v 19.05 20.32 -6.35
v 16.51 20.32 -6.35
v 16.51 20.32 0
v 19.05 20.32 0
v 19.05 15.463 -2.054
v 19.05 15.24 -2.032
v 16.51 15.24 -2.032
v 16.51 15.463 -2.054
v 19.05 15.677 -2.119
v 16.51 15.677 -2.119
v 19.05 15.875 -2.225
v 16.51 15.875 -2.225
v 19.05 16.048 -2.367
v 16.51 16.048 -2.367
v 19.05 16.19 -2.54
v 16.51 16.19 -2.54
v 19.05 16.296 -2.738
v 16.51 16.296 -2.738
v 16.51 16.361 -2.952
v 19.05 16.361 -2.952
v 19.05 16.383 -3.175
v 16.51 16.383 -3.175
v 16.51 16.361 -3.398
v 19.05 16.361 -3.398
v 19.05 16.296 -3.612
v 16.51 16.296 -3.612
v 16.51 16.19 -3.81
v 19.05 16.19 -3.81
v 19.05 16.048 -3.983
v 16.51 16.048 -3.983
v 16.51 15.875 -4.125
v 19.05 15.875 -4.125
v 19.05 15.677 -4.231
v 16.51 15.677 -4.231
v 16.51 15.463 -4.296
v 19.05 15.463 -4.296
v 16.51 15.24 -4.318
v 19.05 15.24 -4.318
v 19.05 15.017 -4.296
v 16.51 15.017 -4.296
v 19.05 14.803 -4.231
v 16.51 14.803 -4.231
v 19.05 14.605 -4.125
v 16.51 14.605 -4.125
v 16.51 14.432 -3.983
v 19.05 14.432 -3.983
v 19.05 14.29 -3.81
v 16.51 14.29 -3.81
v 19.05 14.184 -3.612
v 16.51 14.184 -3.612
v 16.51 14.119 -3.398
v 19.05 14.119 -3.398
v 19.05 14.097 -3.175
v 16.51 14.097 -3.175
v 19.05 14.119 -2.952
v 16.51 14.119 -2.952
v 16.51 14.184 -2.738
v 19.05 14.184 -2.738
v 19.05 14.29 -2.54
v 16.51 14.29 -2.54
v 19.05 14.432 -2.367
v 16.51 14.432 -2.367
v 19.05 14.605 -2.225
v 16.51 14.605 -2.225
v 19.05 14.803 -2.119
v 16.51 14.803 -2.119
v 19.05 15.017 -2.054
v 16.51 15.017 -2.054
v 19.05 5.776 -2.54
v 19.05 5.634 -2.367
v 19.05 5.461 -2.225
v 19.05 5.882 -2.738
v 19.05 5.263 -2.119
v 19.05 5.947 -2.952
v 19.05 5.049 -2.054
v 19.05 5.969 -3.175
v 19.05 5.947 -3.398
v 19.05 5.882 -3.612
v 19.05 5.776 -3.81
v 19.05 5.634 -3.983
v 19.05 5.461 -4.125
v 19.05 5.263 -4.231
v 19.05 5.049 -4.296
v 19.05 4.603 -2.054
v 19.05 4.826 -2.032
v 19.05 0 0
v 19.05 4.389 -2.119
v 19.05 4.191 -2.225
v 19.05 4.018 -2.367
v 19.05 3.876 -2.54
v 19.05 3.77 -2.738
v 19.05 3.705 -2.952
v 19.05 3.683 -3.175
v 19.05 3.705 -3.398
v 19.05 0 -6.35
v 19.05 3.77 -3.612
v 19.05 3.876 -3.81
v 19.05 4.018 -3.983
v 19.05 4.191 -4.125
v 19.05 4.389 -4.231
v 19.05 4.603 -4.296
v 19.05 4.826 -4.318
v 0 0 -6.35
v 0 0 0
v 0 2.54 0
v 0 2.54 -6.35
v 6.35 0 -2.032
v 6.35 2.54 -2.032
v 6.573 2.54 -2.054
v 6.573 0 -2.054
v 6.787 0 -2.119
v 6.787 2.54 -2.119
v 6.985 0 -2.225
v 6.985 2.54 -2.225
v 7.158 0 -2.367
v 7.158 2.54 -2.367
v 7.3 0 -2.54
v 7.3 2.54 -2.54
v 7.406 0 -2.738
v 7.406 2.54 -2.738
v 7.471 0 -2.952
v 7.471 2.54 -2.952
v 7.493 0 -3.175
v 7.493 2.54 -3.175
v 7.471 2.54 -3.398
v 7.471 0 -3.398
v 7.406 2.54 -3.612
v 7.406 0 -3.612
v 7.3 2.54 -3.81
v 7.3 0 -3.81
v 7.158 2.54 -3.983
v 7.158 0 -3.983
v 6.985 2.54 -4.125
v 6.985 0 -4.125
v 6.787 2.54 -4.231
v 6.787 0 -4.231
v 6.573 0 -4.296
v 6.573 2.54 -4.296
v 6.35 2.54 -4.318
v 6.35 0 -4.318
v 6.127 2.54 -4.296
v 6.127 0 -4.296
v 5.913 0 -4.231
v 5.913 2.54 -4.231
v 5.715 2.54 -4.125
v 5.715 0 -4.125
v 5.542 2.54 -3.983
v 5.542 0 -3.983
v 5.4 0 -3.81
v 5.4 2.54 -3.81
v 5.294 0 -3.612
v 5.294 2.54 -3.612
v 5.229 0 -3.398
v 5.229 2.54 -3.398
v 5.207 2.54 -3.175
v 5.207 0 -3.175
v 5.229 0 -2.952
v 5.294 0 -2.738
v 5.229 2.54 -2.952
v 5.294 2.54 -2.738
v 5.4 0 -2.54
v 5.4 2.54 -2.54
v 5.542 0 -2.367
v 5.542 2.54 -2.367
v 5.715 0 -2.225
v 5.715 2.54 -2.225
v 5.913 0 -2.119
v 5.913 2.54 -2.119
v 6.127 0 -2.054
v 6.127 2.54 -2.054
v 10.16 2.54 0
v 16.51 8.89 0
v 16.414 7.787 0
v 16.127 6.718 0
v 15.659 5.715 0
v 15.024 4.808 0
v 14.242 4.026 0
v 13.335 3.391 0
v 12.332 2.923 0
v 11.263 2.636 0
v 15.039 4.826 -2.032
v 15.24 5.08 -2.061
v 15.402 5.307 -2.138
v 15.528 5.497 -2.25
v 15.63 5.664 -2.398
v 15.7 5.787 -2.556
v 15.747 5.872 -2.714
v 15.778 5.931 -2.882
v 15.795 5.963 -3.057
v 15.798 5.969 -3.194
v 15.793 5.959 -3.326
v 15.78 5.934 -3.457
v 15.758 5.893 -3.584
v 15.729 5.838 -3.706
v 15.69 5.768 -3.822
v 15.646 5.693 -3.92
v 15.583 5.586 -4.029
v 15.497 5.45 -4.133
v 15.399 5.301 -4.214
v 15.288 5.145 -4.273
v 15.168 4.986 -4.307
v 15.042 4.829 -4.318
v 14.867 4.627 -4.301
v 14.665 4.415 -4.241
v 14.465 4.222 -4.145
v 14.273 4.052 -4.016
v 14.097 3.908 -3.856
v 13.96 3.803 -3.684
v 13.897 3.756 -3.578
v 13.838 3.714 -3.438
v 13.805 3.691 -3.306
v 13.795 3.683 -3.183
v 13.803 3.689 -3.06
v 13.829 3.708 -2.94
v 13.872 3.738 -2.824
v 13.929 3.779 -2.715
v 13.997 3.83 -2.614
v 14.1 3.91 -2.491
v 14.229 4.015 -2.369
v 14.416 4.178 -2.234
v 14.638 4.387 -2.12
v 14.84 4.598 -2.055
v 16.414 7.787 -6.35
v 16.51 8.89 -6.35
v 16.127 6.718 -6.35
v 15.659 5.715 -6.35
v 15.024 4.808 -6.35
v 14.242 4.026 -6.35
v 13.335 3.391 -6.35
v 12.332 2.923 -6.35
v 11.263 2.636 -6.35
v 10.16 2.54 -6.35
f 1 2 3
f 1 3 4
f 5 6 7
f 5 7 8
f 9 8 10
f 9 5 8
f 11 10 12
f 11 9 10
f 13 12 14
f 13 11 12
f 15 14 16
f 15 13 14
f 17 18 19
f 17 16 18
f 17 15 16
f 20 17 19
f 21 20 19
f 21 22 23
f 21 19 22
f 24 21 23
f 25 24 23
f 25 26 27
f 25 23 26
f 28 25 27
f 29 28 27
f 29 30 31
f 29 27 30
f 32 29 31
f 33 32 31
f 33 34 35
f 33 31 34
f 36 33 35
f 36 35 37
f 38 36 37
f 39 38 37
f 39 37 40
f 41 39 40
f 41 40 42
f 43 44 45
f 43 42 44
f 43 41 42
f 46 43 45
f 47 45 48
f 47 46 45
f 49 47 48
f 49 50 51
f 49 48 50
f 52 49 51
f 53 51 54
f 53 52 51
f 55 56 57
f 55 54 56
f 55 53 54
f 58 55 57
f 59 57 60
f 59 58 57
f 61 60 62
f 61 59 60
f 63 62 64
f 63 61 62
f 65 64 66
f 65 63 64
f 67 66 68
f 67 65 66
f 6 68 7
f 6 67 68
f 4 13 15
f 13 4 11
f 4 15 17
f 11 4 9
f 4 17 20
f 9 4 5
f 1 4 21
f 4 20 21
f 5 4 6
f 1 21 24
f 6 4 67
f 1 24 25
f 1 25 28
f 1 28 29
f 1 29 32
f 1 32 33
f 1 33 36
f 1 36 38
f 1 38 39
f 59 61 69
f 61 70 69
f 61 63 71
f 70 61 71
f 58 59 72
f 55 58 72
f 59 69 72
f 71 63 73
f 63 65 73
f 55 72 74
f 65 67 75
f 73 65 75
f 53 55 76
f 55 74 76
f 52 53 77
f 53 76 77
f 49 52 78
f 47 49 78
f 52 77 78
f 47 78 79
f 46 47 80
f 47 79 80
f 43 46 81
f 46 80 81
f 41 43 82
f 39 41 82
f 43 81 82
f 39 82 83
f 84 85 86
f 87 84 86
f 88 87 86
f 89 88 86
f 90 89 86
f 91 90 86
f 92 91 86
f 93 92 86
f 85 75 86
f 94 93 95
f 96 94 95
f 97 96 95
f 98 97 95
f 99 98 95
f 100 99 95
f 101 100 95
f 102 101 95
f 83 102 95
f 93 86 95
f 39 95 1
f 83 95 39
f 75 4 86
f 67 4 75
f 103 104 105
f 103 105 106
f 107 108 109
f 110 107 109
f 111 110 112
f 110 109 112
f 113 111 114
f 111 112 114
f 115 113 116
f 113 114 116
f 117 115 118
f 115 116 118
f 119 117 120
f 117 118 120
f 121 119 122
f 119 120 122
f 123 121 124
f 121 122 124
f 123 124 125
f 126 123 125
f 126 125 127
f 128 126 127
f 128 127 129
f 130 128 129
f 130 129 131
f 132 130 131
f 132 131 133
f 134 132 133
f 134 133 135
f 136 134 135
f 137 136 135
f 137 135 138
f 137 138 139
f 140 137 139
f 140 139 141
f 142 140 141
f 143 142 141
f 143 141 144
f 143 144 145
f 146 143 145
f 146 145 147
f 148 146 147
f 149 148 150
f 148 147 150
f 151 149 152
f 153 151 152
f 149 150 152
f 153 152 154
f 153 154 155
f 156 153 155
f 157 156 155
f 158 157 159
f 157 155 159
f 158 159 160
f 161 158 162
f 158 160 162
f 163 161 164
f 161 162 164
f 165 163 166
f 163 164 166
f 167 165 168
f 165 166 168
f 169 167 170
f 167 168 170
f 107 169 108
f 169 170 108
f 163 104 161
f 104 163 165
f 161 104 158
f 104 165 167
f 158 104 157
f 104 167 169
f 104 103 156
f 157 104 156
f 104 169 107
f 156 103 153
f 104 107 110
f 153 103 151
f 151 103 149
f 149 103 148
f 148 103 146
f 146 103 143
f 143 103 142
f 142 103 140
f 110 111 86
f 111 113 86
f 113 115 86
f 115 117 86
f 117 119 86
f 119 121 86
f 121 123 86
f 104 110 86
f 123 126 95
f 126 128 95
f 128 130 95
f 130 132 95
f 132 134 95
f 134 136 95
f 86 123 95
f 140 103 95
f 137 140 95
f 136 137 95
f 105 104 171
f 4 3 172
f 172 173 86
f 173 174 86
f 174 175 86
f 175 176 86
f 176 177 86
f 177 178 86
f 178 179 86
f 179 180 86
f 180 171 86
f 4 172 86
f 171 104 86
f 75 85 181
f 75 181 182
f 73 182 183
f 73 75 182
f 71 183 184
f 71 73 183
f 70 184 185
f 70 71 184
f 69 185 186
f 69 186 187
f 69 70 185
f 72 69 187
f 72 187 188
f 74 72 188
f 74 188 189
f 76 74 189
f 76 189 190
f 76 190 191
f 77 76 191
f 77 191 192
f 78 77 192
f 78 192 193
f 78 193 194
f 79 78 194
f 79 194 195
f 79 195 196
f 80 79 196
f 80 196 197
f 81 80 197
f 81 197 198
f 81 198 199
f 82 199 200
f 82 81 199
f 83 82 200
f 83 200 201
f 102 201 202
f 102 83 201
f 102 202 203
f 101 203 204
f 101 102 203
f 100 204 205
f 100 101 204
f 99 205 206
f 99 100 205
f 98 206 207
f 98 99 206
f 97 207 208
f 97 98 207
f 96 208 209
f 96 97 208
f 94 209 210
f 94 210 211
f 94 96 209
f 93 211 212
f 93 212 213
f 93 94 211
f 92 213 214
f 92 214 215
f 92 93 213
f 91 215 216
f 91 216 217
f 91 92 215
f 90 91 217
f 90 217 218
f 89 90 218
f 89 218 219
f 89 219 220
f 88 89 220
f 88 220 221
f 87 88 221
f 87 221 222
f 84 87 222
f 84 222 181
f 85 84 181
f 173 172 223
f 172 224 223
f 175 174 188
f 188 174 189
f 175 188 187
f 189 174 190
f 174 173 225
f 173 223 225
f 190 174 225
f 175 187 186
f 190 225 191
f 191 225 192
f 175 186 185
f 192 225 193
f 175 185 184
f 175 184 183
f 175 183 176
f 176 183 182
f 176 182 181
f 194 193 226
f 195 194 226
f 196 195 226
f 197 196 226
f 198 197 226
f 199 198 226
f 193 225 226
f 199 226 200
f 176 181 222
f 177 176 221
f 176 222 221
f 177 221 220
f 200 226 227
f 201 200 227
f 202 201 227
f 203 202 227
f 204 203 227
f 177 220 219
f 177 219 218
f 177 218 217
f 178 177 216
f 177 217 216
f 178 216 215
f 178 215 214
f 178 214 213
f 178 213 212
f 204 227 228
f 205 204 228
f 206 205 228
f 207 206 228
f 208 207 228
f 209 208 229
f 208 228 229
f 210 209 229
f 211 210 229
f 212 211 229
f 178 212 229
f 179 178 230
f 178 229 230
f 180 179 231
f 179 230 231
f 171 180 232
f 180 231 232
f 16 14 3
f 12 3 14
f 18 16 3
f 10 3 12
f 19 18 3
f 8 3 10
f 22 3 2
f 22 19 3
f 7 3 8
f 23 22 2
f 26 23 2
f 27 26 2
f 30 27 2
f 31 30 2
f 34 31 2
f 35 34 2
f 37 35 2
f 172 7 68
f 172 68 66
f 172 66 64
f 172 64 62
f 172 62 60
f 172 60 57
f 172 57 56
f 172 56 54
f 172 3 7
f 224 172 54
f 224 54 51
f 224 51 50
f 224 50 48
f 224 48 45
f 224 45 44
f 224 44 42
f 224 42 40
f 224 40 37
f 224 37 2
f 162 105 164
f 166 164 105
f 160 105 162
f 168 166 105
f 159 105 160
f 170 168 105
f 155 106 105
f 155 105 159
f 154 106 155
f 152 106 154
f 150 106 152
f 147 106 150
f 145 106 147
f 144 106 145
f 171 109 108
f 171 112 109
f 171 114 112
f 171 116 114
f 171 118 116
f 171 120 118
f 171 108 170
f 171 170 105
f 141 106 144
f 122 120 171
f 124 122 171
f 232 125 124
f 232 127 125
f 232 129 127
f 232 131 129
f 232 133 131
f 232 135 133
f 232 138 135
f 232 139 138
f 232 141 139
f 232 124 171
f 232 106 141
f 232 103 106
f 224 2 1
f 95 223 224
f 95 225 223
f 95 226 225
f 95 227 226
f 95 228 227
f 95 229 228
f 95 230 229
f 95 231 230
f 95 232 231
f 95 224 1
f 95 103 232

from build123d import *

# Parameters (mm, degrees)
SKETCH2_W               = 19.05
SKETCH2_H               = 6.35
BOSS_EXTRUDE1_DEPTH     = 2.54
SKETCH3_W               = 2.54
SKETCH3_H               = 6.35
BOSS_EXTRUDE2_DEPTH     = 17.78
FILLET1_R               = 6.35
SKETCH4_R               = 1.143
CUT_EXTRUDE1_DEPTH      = 27.820764344
CUT_EXTRUDE2_DEPTH      = 27.940768363
CUT_EXTRUDE2_DEPTH_BACK = 27.940768363
SKETCH5_R               = 1.143


with BuildPart() as part:
    # Sketch2 → Boss-Extrude1 (new body)
    with BuildSketch(Plane(origin=(0, 0, 0), x_dir=(1, 0, 0), z_dir=(0, 1, 0))):
        with Locations((9.525, 3.175)):
            Rectangle(SKETCH2_W, SKETCH2_H)
    extrude(amount=BOSS_EXTRUDE1_DEPTH)

    # Sketch3 → Boss-Extrude2 (add)
    with BuildSketch(Plane(origin=(0, 2.54, 0), x_dir=(1, 0, 0), z_dir=(0, 1, 0))):
        with Locations((17.78, 3.175)):
            Rectangle(SKETCH3_W, SKETCH3_H)
    extrude(amount=BOSS_EXTRUDE2_DEPTH)

    # Fillet1
    fillet1_edges = [part.edges().sort_by_distance(p)[0] for p in [
        (16.51, 2.54, -3.175),
    ]]
    fillet(fillet1_edges, radius=FILLET1_R)

    # Sketch4 → Cut-Extrude1 (cut, through all)
    with BuildSketch(Plane(origin=(0, 2.54, 0), x_dir=(1, 0, 0), z_dir=(0, 1, 0))):
        with Locations(Location((6.35, 3.175, 0), (0, 0, 270))):
            Circle(SKETCH4_R)
    extrude(amount=-CUT_EXTRUDE1_DEPTH, mode=Mode.SUBTRACT)

    # Sketch5 → Cut-Extrude2 (cut, two sides: drawn at the far end of the back side and taken through both)
    with BuildSketch(Plane.ZY.offset(-16.51).offset(-CUT_EXTRUDE2_DEPTH_BACK)):
        with Locations((-3.175, 15.24)):
            Circle(SKETCH5_R)
        with Locations((-3.175, 4.826)):
            Circle(SKETCH5_R)
    extrude(amount=CUT_EXTRUDE2_DEPTH + CUT_EXTRUDE2_DEPTH_BACK, mode=Mode.SUBTRACT)


solid = part.part
